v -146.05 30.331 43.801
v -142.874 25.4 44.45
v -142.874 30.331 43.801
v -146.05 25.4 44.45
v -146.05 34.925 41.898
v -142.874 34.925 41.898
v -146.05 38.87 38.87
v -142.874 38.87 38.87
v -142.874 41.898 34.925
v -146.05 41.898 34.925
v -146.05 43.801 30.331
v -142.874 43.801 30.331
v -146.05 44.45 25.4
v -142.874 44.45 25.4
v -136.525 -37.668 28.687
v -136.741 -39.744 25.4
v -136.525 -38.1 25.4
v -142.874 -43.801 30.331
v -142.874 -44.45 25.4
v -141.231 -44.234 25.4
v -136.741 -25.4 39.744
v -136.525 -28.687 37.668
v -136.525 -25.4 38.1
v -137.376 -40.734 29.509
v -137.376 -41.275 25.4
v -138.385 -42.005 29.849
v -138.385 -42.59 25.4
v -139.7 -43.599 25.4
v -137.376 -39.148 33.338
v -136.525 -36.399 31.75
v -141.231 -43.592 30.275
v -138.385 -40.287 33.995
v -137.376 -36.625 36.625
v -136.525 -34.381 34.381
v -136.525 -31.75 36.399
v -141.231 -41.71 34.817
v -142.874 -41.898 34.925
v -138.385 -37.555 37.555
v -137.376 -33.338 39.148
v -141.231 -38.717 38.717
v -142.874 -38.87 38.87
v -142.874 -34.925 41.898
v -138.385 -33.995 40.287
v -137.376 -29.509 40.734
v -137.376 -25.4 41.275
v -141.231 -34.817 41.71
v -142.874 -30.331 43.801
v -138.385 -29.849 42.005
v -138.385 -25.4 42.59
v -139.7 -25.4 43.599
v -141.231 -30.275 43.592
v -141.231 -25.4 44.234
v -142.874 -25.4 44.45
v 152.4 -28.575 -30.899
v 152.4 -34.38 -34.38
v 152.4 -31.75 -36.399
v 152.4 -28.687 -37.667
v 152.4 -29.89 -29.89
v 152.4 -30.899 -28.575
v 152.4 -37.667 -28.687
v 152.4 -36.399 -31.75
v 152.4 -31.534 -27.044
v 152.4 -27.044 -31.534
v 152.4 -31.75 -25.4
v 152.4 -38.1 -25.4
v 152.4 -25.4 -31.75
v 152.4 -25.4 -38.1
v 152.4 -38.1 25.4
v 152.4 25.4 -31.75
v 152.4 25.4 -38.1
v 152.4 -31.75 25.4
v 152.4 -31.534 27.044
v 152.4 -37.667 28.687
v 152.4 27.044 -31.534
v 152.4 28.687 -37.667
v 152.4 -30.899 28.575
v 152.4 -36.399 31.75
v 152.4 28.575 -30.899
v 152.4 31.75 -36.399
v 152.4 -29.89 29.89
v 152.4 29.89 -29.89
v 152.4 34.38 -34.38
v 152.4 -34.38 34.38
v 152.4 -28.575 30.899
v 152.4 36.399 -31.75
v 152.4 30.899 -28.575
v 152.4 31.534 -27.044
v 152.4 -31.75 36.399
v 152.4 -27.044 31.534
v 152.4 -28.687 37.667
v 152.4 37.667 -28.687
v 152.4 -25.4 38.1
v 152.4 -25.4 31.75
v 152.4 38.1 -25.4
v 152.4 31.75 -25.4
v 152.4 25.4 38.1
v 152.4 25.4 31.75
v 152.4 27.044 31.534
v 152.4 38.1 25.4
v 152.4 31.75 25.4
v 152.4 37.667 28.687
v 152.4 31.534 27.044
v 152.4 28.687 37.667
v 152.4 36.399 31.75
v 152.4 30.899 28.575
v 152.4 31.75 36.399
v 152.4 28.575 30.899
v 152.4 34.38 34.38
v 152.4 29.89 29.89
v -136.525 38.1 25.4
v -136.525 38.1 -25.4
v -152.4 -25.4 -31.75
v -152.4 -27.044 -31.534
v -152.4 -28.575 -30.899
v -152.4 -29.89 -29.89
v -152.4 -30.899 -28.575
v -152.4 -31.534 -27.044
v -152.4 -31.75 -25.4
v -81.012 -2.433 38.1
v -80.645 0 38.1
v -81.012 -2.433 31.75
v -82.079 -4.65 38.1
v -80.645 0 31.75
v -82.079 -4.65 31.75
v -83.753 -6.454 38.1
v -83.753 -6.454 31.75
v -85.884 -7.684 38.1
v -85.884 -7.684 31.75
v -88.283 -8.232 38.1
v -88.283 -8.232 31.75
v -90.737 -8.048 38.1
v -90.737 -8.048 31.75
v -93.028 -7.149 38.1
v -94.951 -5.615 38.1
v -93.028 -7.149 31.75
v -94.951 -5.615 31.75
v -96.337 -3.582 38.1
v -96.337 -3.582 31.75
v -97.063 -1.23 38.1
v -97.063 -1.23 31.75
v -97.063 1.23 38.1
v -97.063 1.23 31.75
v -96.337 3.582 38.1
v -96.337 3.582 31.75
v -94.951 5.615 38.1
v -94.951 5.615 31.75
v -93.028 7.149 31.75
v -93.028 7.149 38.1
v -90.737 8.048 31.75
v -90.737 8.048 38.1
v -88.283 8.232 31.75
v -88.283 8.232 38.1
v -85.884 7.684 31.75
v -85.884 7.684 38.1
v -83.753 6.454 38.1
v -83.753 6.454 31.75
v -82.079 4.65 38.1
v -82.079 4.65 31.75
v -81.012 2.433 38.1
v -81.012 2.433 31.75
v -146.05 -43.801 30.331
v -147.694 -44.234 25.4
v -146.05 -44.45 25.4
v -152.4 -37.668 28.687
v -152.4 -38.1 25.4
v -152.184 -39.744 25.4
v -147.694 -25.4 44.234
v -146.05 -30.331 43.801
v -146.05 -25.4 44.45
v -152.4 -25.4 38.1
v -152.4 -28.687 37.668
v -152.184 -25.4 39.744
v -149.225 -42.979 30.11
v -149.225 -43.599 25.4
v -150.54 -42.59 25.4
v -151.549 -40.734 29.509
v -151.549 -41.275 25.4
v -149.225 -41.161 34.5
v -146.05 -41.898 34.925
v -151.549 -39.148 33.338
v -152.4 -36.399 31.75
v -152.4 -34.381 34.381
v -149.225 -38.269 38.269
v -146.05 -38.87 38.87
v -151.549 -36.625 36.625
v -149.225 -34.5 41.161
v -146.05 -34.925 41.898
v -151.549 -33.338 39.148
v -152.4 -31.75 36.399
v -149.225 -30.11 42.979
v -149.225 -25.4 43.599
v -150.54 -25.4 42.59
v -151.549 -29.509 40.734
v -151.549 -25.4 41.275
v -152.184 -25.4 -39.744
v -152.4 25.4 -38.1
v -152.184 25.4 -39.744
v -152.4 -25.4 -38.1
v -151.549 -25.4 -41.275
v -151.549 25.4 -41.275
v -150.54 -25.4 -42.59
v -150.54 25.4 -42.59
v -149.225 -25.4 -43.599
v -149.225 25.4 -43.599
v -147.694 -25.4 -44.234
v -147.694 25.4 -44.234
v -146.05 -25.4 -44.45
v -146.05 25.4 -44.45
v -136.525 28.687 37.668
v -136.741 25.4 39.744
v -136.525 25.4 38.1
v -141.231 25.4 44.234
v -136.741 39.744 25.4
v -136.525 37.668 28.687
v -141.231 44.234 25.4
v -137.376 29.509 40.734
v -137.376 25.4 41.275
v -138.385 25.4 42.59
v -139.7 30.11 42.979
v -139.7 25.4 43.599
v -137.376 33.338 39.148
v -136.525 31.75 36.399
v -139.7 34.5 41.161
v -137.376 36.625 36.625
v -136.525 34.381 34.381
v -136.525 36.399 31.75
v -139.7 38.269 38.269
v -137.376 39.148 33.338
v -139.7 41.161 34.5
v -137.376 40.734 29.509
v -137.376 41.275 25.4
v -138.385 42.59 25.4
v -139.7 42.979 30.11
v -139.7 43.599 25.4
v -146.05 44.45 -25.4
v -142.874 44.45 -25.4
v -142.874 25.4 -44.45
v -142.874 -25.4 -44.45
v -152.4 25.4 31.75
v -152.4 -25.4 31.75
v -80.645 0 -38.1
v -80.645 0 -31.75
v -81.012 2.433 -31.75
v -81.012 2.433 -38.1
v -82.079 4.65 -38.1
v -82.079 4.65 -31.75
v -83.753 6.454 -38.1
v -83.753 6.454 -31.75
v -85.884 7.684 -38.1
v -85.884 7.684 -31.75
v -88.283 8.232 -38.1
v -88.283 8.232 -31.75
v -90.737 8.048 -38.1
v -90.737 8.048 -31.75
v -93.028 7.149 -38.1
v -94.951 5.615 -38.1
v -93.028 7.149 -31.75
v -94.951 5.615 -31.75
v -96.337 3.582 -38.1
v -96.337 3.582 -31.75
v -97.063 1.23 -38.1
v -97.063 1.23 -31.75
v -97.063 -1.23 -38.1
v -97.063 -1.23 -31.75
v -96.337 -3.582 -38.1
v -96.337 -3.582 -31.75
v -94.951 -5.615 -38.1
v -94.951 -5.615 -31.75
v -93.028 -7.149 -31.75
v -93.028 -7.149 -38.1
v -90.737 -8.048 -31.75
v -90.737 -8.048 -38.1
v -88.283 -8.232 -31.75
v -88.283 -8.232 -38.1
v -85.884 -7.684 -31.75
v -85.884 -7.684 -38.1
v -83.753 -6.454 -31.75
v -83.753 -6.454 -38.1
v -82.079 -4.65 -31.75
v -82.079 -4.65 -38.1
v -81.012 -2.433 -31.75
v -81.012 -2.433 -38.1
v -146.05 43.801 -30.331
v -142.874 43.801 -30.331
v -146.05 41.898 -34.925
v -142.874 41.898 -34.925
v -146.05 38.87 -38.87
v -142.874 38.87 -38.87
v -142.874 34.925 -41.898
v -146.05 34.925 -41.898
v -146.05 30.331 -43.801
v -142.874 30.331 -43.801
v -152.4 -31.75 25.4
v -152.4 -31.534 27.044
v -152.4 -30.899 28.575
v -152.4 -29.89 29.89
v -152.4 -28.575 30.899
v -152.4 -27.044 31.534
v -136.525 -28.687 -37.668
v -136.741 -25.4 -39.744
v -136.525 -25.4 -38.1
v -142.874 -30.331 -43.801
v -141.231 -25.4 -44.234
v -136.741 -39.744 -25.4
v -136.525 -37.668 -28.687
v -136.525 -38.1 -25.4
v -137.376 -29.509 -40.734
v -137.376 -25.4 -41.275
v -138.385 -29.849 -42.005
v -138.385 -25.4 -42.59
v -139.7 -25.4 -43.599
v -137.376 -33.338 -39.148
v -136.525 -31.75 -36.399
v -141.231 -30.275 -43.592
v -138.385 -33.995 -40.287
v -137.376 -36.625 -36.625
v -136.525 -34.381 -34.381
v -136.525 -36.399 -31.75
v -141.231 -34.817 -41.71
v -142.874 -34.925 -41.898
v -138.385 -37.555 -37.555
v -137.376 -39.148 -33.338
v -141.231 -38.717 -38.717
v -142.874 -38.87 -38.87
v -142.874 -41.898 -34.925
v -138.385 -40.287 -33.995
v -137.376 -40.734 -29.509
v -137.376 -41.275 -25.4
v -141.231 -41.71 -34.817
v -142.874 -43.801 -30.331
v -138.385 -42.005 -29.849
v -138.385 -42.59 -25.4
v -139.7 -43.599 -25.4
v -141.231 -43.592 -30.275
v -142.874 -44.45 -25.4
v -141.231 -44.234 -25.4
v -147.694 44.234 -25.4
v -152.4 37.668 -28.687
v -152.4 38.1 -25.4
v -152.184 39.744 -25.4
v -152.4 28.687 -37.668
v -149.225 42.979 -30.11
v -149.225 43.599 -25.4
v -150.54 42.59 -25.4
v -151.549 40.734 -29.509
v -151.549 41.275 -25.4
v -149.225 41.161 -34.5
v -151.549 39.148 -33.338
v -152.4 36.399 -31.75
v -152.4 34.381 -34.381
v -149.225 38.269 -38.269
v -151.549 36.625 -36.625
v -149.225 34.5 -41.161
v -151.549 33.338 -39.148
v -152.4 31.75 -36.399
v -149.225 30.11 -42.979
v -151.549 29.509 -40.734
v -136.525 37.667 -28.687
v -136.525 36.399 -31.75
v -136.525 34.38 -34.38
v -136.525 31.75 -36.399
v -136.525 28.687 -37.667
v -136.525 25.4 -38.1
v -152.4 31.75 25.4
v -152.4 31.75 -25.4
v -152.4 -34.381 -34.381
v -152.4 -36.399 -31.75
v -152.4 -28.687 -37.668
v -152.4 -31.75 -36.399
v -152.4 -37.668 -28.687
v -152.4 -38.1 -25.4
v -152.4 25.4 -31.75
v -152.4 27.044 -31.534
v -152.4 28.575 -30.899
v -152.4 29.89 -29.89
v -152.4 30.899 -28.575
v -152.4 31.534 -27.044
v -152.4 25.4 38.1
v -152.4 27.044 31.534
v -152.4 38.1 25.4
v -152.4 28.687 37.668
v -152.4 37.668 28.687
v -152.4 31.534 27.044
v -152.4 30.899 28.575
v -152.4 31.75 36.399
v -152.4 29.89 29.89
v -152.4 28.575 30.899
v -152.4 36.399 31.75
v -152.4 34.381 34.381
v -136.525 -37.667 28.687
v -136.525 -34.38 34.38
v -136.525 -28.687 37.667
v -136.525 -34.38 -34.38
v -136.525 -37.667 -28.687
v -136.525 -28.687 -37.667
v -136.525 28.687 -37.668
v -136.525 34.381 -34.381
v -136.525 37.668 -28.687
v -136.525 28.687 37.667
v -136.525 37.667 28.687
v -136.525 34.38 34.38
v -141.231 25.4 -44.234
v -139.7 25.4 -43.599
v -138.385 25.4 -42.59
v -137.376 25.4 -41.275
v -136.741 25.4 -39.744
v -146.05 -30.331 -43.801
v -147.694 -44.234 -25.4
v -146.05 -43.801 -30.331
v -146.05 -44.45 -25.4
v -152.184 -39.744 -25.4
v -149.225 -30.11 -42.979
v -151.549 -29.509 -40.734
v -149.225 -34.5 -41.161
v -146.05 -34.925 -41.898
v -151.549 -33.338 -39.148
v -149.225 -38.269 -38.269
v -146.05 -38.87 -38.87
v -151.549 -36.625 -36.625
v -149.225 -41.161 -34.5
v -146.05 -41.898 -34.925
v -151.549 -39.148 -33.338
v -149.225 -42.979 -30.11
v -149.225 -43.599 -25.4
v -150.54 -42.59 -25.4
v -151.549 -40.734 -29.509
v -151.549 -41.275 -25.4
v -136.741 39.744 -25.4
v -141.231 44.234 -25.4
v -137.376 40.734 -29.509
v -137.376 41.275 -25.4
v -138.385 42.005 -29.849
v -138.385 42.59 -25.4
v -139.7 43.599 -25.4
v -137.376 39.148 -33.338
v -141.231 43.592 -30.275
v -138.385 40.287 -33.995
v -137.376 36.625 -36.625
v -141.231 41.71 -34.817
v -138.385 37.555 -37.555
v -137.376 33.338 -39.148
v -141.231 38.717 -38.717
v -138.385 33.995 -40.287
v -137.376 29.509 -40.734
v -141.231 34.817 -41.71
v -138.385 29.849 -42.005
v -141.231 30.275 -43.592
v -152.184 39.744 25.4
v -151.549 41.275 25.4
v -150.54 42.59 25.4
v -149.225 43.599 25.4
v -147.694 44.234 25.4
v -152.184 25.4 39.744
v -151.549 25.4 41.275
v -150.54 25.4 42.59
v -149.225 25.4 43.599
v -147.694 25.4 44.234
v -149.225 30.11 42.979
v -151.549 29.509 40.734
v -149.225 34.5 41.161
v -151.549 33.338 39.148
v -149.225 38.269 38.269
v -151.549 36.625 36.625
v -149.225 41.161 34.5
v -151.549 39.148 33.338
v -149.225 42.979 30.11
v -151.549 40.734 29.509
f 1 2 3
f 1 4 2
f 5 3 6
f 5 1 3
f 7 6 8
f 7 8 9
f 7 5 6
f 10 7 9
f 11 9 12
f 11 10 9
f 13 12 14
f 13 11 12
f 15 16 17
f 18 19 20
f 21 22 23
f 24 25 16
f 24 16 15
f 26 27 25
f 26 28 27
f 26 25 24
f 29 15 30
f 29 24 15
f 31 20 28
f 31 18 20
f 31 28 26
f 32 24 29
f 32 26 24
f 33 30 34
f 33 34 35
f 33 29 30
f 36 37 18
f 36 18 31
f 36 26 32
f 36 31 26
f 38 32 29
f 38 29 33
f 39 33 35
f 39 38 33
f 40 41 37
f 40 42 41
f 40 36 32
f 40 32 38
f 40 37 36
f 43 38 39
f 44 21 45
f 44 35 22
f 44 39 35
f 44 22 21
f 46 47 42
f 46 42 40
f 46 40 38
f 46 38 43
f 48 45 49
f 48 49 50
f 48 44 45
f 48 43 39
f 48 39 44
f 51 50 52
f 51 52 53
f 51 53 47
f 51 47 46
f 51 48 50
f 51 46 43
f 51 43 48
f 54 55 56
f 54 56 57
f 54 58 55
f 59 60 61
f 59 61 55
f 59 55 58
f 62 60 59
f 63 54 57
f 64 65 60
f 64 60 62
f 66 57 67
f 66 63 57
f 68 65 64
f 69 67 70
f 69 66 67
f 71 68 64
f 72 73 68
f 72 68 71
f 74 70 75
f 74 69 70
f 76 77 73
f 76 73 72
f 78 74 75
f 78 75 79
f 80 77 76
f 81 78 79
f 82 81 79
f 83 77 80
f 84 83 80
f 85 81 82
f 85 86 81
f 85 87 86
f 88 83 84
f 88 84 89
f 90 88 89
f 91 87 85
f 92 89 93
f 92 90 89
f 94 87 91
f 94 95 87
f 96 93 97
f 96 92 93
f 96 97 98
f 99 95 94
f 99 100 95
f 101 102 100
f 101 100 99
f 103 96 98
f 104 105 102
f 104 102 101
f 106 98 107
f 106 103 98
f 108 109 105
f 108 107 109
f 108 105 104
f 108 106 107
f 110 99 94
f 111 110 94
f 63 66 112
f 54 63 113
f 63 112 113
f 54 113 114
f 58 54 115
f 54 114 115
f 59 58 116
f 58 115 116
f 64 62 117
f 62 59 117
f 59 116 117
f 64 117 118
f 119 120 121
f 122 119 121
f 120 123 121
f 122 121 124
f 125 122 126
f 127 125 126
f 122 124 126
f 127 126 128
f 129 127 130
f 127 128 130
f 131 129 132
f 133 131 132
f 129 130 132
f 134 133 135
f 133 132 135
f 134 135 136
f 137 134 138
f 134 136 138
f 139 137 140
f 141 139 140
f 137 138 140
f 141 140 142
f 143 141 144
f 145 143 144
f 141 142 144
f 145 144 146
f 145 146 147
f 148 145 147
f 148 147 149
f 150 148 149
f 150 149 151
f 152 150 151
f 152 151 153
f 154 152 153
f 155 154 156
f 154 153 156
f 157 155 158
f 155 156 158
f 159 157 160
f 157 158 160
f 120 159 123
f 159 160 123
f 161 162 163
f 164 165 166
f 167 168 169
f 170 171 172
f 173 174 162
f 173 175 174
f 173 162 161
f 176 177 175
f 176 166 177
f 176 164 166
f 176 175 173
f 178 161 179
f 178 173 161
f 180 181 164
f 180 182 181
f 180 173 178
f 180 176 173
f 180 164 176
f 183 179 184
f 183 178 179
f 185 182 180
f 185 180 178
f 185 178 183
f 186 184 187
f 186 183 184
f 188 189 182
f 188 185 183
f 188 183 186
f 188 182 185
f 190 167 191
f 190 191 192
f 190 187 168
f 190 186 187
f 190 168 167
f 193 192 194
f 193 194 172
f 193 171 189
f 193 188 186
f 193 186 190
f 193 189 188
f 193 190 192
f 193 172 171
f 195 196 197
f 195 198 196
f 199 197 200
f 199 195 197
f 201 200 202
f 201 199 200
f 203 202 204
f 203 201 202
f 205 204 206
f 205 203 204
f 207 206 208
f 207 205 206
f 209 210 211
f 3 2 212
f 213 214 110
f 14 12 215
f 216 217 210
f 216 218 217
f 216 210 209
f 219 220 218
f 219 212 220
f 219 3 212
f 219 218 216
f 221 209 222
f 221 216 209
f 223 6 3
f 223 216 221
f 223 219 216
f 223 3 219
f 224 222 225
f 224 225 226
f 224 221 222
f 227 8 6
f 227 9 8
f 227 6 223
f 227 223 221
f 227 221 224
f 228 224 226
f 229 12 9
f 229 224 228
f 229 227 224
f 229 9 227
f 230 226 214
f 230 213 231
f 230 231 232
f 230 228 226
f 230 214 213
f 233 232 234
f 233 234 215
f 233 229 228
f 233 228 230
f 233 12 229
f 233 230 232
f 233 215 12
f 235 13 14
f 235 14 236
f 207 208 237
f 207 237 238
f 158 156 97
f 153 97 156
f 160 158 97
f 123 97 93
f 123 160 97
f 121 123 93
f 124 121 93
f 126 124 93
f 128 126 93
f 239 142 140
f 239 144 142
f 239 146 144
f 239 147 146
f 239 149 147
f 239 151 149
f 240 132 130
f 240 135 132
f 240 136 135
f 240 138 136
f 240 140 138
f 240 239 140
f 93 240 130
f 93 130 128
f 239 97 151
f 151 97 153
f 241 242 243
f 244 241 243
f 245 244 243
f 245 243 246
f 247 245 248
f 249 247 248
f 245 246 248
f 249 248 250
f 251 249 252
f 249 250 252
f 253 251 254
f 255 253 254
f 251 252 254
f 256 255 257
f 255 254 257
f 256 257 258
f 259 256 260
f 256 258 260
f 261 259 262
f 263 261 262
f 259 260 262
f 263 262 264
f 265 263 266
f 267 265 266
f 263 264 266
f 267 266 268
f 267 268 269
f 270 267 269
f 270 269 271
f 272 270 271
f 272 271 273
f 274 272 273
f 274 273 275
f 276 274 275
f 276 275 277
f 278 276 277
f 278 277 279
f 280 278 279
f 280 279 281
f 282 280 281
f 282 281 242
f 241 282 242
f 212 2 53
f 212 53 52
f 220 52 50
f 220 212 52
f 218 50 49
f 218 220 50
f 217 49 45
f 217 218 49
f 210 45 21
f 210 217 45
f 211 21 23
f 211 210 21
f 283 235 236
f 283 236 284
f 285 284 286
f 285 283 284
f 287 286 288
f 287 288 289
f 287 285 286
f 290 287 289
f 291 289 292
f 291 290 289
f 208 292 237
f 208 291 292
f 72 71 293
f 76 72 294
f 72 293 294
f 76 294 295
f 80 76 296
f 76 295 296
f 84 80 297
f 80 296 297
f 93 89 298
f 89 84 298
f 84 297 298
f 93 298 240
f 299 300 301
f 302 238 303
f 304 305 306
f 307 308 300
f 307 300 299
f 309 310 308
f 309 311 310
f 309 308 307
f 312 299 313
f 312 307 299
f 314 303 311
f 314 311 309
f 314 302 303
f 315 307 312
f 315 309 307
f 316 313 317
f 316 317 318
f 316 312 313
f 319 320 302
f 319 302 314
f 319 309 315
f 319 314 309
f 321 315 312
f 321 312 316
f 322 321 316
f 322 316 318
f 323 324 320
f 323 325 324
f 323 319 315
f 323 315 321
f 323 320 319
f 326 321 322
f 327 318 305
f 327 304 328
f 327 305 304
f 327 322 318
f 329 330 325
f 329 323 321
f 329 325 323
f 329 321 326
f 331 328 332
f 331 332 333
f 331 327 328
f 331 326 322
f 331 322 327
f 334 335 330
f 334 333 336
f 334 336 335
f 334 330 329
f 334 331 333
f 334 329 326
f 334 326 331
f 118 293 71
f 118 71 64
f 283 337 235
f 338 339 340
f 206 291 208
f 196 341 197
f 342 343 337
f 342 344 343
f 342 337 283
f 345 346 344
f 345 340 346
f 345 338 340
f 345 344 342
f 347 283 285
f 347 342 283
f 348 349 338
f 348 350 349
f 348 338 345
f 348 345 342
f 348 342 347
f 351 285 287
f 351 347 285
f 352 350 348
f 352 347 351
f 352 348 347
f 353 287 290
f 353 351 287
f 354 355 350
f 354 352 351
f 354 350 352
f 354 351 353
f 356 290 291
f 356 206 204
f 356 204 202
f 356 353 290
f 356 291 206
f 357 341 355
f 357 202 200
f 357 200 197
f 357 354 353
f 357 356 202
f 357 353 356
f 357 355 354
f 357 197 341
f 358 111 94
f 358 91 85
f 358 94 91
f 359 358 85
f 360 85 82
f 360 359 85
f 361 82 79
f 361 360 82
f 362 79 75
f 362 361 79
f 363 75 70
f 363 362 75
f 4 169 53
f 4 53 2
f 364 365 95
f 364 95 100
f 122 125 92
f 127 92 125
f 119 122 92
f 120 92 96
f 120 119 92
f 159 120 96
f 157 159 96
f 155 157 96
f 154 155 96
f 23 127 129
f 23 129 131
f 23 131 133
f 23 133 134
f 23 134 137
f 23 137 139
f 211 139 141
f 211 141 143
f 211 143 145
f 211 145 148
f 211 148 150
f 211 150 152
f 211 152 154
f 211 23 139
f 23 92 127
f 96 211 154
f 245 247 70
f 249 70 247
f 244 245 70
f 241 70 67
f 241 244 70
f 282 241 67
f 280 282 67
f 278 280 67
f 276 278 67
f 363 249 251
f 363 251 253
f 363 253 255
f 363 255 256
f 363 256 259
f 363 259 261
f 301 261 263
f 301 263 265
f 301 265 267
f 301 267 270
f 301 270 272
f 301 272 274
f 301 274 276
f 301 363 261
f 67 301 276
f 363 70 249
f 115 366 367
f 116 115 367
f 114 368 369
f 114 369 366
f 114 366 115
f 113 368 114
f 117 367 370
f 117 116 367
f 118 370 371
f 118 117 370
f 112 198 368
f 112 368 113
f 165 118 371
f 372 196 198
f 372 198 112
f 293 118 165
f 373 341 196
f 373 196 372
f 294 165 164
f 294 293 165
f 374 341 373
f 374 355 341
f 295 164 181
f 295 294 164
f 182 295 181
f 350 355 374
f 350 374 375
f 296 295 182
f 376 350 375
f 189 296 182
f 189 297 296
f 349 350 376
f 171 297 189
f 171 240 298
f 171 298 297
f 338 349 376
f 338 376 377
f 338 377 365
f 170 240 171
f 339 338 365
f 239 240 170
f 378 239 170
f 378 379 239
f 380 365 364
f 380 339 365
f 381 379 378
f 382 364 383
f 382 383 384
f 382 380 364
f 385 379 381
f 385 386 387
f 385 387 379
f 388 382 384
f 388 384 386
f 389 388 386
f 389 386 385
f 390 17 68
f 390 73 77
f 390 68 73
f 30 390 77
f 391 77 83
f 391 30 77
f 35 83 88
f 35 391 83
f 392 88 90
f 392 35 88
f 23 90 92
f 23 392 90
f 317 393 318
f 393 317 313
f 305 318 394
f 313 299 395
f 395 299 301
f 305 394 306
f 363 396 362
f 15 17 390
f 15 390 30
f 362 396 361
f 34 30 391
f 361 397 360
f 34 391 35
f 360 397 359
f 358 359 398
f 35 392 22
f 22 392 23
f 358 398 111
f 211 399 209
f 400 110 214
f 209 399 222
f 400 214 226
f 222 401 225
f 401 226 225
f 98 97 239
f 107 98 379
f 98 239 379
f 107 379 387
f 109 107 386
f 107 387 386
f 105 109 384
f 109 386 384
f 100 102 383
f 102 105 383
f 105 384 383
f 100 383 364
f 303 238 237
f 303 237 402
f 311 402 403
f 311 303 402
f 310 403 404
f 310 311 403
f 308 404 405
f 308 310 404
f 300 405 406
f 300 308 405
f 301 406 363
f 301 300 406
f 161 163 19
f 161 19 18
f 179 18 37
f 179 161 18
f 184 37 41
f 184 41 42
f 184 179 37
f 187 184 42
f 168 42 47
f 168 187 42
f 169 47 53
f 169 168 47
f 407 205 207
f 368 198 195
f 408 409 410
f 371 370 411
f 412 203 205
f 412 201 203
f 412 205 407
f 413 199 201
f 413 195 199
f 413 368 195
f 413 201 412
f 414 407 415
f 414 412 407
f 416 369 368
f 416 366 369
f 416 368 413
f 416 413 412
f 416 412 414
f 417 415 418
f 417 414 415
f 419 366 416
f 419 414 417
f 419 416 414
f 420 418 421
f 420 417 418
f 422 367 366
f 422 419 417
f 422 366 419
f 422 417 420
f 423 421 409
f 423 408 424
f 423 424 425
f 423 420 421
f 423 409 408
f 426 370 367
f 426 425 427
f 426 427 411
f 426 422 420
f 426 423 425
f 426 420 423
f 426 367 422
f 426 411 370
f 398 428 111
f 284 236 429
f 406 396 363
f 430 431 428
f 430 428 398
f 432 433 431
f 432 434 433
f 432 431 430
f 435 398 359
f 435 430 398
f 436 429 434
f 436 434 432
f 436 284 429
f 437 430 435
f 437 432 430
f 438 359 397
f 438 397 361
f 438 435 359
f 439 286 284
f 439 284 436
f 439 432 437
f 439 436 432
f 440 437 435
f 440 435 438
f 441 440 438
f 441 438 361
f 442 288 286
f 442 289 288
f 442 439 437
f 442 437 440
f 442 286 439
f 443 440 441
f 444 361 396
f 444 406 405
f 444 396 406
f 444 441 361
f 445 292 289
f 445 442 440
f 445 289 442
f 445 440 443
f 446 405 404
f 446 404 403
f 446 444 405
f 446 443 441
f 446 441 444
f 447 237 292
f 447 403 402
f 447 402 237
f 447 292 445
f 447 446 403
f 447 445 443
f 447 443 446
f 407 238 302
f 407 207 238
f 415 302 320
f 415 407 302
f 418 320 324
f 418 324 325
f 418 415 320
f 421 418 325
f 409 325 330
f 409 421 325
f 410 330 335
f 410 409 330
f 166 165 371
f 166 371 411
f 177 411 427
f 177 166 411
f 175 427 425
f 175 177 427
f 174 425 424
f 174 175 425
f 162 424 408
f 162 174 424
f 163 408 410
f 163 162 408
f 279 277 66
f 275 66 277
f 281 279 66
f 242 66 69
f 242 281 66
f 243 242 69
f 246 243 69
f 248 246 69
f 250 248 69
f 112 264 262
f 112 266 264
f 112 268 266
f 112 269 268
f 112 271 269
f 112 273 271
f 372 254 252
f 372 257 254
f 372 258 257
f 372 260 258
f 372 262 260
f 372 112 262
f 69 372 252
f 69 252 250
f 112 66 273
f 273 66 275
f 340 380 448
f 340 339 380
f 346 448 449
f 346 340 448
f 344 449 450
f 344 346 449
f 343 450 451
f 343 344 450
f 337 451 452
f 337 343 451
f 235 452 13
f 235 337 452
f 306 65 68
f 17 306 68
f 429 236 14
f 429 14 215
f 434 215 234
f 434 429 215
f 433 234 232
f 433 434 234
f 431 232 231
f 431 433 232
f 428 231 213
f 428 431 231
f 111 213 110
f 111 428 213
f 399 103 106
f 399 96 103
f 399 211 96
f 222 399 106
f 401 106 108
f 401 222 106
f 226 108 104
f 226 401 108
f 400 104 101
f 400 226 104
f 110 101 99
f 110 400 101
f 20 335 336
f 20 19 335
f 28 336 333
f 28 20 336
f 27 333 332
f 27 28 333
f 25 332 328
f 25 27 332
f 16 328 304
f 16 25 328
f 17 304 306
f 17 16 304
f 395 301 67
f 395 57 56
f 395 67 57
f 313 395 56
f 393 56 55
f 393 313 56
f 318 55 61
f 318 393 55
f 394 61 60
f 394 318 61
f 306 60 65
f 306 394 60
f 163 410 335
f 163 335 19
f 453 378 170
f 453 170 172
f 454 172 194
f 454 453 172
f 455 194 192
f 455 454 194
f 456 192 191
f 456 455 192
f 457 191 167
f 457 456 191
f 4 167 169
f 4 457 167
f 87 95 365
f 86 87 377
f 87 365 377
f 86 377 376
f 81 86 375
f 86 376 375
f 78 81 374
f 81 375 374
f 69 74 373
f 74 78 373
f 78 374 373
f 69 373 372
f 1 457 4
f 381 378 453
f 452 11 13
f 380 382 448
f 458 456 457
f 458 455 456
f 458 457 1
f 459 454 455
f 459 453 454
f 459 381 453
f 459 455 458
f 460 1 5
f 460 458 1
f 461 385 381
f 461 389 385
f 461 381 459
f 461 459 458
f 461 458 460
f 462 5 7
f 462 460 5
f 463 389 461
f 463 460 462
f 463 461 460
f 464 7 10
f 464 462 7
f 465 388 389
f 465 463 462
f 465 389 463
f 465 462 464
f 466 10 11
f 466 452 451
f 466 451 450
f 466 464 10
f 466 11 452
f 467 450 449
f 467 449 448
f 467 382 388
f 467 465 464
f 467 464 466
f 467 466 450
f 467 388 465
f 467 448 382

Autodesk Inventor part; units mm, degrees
ref_plane "YZ Plane" through (0, 0, 0) normal (1, 0, 0) x (0, 1, 0)
ref_plane "XZ Plane" through (0, 0, 0) normal (0, 1, 0) x (-1, 0, 0)
ref_plane "XY Plane" through (0, 0, 0) normal (0, 0, 1) x (1, 0, 0)
sketch "Sketch5" plane through (0, 0, 0) normal (1, 0, 0) x (0, 1, 0)
  line L0 (-25.4, 38.1) -> (25.4, 38.1)
  line L1 (38.1, 25.4) -> (38.1, -25.4)
  line L2 (25.4, -38.1) -> (-25.4, -38.1)
  line L3 (-38.1, -25.4) -> (-38.1, 25.4)
  line L4 (-38.1, 38.1) -> (38.1, -38.1) construction
  line L5 (38.1, 38.1) -> (-38.1, -38.1) construction
  arc A0 (38.1, 25.4) -> (25.4, 38.1) centre (25.4, 25.4) ccw
  arc A1 (25.4, -38.1) -> (38.1, -25.4) centre (25.4, -25.4) ccw
  arc A2 (-38.1, -25.4) -> (-25.4, -38.1) centre (-25.4, -25.4) ccw
  arc A3 (-25.4, 38.1) -> (-38.1, 25.4) centre (-25.4, 25.4) ccw
  line L6 (31.75, -25.4) -> (31.75, 25.4)
  arc A4 (31.75, 25.4) -> (25.4, 31.75) centre (25.4, 25.4) ccw
  line L7 (25.4, 31.75) -> (-25.4, 31.75)
  arc A5 (-25.4, 31.75) -> (-31.75, 25.4) centre (-25.4, 25.4) ccw
  line L8 (-31.75, 25.4) -> (-31.75, -25.4)
  arc A6 (-31.75, -25.4) -> (-25.4, -31.75) centre (-25.4, -25.4) ccw
  line L9 (-25.4, -31.75) -> (25.4, -31.75)
  arc A7 (25.4, -31.75) -> (31.75, -25.4) centre (25.4, -25.4) ccw
  point P0 (0, 0)
  dimension "d6" = 76.2
  dimension "d7" = 76.2
  dimension "d8" = 12.7
  dimension "d9" = 6.35
extrude "Extrusion4" add sketch "Sketch5" along normal mid plane 304.8
sketch "Sketch7" plane through (-152.4, 0, 0) normal (-1, 0, 0) x (0, 0, 1)
  arc A0 (-38.1, -25.4) -> (-25.4, -38.1) centre (-25.4, -25.4) ccw projected
  line L0 (-25.4, -38.1) -> (25.4, -38.1) projected
  arc A1 (25.4, -38.1) -> (38.1, -25.4) centre (25.4, -25.4) ccw projected
  line L1 (38.1, -25.4) -> (38.1, 25.4) projected
  arc A2 (38.1, 25.4) -> (25.4, 38.1) centre (25.4, 25.4) ccw projected
  line L2 (25.4, 38.1) -> (-25.4, 38.1) projected
  arc A3 (-25.4, 38.1) -> (-38.1, 25.4) centre (-25.4, 25.4) ccw projected
  line L3 (-38.1, 25.4) -> (-38.1, -25.4) projected
  arc A4 (-44.45, -25.4) -> (-25.4, -44.45) centre (-25.4, -25.4) ccw
  line L4 (-25.4, -44.45) -> (25.4, -44.45)
  arc A5 (25.4, -44.45) -> (44.45, -25.4) centre (25.4, -25.4) ccw
  line L5 (44.45, -25.4) -> (44.45, 25.4)
  arc A6 (44.45, 25.4) -> (25.4, 44.45) centre (25.4, 25.4) ccw
  line L6 (25.4, 44.45) -> (-25.4, 44.45)
  arc A7 (-25.4, 44.45) -> (-44.45, 25.4) centre (-25.4, 25.4) ccw
  line L7 (-44.45, 25.4) -> (-44.45, -25.4)
  point P0 (0, 0)
extrude "Extrusion5" add sketch "Sketch7" against normal blind 15.875
fillet "Fillet1" radius 6.35 16 edges at (-152.4, 38.8704, -38.8704) (-152.4, 0, -44.45) (-152.4, -38.8704, -38.8704) (-152.4, -44.45, 0) (-152.4, -38.8704, 38.8704) (-152.4, 0, 44.45) (-152.4, 38.8704, 38.8704) (-152.4, 44.45, 0) (-136.525, 38.8704, 38.8704) (-136.525, 0, 44.45) (-136.525, -38.8704, 38.8704) (-136.525, -44.45, 0) (-136.525, -38.8704, -38.8704) (-136.525, 0, -44.45) (-136.525, 38.8704, -38.8704) (-136.525, 44.45, 0)
sketch "Sketch8" plane through (0, 0, 0) normal (0, 0, 1) x (1, 0, 0)
  circle A0 centre (-88.9, 0) radius 8.255
  line L0 (-152.4, 25.4) -> (-152.4, -25.4) projected
  point P0 (0, 0)
  dimension "d15" = 63.5
  dimension "d16" = 16.51
extrude "Extrusion6" cut sketch "Sketch8" along normal through all both and the other way through all
properties part number "Model-1_Base Tube-3" material "SS304"
